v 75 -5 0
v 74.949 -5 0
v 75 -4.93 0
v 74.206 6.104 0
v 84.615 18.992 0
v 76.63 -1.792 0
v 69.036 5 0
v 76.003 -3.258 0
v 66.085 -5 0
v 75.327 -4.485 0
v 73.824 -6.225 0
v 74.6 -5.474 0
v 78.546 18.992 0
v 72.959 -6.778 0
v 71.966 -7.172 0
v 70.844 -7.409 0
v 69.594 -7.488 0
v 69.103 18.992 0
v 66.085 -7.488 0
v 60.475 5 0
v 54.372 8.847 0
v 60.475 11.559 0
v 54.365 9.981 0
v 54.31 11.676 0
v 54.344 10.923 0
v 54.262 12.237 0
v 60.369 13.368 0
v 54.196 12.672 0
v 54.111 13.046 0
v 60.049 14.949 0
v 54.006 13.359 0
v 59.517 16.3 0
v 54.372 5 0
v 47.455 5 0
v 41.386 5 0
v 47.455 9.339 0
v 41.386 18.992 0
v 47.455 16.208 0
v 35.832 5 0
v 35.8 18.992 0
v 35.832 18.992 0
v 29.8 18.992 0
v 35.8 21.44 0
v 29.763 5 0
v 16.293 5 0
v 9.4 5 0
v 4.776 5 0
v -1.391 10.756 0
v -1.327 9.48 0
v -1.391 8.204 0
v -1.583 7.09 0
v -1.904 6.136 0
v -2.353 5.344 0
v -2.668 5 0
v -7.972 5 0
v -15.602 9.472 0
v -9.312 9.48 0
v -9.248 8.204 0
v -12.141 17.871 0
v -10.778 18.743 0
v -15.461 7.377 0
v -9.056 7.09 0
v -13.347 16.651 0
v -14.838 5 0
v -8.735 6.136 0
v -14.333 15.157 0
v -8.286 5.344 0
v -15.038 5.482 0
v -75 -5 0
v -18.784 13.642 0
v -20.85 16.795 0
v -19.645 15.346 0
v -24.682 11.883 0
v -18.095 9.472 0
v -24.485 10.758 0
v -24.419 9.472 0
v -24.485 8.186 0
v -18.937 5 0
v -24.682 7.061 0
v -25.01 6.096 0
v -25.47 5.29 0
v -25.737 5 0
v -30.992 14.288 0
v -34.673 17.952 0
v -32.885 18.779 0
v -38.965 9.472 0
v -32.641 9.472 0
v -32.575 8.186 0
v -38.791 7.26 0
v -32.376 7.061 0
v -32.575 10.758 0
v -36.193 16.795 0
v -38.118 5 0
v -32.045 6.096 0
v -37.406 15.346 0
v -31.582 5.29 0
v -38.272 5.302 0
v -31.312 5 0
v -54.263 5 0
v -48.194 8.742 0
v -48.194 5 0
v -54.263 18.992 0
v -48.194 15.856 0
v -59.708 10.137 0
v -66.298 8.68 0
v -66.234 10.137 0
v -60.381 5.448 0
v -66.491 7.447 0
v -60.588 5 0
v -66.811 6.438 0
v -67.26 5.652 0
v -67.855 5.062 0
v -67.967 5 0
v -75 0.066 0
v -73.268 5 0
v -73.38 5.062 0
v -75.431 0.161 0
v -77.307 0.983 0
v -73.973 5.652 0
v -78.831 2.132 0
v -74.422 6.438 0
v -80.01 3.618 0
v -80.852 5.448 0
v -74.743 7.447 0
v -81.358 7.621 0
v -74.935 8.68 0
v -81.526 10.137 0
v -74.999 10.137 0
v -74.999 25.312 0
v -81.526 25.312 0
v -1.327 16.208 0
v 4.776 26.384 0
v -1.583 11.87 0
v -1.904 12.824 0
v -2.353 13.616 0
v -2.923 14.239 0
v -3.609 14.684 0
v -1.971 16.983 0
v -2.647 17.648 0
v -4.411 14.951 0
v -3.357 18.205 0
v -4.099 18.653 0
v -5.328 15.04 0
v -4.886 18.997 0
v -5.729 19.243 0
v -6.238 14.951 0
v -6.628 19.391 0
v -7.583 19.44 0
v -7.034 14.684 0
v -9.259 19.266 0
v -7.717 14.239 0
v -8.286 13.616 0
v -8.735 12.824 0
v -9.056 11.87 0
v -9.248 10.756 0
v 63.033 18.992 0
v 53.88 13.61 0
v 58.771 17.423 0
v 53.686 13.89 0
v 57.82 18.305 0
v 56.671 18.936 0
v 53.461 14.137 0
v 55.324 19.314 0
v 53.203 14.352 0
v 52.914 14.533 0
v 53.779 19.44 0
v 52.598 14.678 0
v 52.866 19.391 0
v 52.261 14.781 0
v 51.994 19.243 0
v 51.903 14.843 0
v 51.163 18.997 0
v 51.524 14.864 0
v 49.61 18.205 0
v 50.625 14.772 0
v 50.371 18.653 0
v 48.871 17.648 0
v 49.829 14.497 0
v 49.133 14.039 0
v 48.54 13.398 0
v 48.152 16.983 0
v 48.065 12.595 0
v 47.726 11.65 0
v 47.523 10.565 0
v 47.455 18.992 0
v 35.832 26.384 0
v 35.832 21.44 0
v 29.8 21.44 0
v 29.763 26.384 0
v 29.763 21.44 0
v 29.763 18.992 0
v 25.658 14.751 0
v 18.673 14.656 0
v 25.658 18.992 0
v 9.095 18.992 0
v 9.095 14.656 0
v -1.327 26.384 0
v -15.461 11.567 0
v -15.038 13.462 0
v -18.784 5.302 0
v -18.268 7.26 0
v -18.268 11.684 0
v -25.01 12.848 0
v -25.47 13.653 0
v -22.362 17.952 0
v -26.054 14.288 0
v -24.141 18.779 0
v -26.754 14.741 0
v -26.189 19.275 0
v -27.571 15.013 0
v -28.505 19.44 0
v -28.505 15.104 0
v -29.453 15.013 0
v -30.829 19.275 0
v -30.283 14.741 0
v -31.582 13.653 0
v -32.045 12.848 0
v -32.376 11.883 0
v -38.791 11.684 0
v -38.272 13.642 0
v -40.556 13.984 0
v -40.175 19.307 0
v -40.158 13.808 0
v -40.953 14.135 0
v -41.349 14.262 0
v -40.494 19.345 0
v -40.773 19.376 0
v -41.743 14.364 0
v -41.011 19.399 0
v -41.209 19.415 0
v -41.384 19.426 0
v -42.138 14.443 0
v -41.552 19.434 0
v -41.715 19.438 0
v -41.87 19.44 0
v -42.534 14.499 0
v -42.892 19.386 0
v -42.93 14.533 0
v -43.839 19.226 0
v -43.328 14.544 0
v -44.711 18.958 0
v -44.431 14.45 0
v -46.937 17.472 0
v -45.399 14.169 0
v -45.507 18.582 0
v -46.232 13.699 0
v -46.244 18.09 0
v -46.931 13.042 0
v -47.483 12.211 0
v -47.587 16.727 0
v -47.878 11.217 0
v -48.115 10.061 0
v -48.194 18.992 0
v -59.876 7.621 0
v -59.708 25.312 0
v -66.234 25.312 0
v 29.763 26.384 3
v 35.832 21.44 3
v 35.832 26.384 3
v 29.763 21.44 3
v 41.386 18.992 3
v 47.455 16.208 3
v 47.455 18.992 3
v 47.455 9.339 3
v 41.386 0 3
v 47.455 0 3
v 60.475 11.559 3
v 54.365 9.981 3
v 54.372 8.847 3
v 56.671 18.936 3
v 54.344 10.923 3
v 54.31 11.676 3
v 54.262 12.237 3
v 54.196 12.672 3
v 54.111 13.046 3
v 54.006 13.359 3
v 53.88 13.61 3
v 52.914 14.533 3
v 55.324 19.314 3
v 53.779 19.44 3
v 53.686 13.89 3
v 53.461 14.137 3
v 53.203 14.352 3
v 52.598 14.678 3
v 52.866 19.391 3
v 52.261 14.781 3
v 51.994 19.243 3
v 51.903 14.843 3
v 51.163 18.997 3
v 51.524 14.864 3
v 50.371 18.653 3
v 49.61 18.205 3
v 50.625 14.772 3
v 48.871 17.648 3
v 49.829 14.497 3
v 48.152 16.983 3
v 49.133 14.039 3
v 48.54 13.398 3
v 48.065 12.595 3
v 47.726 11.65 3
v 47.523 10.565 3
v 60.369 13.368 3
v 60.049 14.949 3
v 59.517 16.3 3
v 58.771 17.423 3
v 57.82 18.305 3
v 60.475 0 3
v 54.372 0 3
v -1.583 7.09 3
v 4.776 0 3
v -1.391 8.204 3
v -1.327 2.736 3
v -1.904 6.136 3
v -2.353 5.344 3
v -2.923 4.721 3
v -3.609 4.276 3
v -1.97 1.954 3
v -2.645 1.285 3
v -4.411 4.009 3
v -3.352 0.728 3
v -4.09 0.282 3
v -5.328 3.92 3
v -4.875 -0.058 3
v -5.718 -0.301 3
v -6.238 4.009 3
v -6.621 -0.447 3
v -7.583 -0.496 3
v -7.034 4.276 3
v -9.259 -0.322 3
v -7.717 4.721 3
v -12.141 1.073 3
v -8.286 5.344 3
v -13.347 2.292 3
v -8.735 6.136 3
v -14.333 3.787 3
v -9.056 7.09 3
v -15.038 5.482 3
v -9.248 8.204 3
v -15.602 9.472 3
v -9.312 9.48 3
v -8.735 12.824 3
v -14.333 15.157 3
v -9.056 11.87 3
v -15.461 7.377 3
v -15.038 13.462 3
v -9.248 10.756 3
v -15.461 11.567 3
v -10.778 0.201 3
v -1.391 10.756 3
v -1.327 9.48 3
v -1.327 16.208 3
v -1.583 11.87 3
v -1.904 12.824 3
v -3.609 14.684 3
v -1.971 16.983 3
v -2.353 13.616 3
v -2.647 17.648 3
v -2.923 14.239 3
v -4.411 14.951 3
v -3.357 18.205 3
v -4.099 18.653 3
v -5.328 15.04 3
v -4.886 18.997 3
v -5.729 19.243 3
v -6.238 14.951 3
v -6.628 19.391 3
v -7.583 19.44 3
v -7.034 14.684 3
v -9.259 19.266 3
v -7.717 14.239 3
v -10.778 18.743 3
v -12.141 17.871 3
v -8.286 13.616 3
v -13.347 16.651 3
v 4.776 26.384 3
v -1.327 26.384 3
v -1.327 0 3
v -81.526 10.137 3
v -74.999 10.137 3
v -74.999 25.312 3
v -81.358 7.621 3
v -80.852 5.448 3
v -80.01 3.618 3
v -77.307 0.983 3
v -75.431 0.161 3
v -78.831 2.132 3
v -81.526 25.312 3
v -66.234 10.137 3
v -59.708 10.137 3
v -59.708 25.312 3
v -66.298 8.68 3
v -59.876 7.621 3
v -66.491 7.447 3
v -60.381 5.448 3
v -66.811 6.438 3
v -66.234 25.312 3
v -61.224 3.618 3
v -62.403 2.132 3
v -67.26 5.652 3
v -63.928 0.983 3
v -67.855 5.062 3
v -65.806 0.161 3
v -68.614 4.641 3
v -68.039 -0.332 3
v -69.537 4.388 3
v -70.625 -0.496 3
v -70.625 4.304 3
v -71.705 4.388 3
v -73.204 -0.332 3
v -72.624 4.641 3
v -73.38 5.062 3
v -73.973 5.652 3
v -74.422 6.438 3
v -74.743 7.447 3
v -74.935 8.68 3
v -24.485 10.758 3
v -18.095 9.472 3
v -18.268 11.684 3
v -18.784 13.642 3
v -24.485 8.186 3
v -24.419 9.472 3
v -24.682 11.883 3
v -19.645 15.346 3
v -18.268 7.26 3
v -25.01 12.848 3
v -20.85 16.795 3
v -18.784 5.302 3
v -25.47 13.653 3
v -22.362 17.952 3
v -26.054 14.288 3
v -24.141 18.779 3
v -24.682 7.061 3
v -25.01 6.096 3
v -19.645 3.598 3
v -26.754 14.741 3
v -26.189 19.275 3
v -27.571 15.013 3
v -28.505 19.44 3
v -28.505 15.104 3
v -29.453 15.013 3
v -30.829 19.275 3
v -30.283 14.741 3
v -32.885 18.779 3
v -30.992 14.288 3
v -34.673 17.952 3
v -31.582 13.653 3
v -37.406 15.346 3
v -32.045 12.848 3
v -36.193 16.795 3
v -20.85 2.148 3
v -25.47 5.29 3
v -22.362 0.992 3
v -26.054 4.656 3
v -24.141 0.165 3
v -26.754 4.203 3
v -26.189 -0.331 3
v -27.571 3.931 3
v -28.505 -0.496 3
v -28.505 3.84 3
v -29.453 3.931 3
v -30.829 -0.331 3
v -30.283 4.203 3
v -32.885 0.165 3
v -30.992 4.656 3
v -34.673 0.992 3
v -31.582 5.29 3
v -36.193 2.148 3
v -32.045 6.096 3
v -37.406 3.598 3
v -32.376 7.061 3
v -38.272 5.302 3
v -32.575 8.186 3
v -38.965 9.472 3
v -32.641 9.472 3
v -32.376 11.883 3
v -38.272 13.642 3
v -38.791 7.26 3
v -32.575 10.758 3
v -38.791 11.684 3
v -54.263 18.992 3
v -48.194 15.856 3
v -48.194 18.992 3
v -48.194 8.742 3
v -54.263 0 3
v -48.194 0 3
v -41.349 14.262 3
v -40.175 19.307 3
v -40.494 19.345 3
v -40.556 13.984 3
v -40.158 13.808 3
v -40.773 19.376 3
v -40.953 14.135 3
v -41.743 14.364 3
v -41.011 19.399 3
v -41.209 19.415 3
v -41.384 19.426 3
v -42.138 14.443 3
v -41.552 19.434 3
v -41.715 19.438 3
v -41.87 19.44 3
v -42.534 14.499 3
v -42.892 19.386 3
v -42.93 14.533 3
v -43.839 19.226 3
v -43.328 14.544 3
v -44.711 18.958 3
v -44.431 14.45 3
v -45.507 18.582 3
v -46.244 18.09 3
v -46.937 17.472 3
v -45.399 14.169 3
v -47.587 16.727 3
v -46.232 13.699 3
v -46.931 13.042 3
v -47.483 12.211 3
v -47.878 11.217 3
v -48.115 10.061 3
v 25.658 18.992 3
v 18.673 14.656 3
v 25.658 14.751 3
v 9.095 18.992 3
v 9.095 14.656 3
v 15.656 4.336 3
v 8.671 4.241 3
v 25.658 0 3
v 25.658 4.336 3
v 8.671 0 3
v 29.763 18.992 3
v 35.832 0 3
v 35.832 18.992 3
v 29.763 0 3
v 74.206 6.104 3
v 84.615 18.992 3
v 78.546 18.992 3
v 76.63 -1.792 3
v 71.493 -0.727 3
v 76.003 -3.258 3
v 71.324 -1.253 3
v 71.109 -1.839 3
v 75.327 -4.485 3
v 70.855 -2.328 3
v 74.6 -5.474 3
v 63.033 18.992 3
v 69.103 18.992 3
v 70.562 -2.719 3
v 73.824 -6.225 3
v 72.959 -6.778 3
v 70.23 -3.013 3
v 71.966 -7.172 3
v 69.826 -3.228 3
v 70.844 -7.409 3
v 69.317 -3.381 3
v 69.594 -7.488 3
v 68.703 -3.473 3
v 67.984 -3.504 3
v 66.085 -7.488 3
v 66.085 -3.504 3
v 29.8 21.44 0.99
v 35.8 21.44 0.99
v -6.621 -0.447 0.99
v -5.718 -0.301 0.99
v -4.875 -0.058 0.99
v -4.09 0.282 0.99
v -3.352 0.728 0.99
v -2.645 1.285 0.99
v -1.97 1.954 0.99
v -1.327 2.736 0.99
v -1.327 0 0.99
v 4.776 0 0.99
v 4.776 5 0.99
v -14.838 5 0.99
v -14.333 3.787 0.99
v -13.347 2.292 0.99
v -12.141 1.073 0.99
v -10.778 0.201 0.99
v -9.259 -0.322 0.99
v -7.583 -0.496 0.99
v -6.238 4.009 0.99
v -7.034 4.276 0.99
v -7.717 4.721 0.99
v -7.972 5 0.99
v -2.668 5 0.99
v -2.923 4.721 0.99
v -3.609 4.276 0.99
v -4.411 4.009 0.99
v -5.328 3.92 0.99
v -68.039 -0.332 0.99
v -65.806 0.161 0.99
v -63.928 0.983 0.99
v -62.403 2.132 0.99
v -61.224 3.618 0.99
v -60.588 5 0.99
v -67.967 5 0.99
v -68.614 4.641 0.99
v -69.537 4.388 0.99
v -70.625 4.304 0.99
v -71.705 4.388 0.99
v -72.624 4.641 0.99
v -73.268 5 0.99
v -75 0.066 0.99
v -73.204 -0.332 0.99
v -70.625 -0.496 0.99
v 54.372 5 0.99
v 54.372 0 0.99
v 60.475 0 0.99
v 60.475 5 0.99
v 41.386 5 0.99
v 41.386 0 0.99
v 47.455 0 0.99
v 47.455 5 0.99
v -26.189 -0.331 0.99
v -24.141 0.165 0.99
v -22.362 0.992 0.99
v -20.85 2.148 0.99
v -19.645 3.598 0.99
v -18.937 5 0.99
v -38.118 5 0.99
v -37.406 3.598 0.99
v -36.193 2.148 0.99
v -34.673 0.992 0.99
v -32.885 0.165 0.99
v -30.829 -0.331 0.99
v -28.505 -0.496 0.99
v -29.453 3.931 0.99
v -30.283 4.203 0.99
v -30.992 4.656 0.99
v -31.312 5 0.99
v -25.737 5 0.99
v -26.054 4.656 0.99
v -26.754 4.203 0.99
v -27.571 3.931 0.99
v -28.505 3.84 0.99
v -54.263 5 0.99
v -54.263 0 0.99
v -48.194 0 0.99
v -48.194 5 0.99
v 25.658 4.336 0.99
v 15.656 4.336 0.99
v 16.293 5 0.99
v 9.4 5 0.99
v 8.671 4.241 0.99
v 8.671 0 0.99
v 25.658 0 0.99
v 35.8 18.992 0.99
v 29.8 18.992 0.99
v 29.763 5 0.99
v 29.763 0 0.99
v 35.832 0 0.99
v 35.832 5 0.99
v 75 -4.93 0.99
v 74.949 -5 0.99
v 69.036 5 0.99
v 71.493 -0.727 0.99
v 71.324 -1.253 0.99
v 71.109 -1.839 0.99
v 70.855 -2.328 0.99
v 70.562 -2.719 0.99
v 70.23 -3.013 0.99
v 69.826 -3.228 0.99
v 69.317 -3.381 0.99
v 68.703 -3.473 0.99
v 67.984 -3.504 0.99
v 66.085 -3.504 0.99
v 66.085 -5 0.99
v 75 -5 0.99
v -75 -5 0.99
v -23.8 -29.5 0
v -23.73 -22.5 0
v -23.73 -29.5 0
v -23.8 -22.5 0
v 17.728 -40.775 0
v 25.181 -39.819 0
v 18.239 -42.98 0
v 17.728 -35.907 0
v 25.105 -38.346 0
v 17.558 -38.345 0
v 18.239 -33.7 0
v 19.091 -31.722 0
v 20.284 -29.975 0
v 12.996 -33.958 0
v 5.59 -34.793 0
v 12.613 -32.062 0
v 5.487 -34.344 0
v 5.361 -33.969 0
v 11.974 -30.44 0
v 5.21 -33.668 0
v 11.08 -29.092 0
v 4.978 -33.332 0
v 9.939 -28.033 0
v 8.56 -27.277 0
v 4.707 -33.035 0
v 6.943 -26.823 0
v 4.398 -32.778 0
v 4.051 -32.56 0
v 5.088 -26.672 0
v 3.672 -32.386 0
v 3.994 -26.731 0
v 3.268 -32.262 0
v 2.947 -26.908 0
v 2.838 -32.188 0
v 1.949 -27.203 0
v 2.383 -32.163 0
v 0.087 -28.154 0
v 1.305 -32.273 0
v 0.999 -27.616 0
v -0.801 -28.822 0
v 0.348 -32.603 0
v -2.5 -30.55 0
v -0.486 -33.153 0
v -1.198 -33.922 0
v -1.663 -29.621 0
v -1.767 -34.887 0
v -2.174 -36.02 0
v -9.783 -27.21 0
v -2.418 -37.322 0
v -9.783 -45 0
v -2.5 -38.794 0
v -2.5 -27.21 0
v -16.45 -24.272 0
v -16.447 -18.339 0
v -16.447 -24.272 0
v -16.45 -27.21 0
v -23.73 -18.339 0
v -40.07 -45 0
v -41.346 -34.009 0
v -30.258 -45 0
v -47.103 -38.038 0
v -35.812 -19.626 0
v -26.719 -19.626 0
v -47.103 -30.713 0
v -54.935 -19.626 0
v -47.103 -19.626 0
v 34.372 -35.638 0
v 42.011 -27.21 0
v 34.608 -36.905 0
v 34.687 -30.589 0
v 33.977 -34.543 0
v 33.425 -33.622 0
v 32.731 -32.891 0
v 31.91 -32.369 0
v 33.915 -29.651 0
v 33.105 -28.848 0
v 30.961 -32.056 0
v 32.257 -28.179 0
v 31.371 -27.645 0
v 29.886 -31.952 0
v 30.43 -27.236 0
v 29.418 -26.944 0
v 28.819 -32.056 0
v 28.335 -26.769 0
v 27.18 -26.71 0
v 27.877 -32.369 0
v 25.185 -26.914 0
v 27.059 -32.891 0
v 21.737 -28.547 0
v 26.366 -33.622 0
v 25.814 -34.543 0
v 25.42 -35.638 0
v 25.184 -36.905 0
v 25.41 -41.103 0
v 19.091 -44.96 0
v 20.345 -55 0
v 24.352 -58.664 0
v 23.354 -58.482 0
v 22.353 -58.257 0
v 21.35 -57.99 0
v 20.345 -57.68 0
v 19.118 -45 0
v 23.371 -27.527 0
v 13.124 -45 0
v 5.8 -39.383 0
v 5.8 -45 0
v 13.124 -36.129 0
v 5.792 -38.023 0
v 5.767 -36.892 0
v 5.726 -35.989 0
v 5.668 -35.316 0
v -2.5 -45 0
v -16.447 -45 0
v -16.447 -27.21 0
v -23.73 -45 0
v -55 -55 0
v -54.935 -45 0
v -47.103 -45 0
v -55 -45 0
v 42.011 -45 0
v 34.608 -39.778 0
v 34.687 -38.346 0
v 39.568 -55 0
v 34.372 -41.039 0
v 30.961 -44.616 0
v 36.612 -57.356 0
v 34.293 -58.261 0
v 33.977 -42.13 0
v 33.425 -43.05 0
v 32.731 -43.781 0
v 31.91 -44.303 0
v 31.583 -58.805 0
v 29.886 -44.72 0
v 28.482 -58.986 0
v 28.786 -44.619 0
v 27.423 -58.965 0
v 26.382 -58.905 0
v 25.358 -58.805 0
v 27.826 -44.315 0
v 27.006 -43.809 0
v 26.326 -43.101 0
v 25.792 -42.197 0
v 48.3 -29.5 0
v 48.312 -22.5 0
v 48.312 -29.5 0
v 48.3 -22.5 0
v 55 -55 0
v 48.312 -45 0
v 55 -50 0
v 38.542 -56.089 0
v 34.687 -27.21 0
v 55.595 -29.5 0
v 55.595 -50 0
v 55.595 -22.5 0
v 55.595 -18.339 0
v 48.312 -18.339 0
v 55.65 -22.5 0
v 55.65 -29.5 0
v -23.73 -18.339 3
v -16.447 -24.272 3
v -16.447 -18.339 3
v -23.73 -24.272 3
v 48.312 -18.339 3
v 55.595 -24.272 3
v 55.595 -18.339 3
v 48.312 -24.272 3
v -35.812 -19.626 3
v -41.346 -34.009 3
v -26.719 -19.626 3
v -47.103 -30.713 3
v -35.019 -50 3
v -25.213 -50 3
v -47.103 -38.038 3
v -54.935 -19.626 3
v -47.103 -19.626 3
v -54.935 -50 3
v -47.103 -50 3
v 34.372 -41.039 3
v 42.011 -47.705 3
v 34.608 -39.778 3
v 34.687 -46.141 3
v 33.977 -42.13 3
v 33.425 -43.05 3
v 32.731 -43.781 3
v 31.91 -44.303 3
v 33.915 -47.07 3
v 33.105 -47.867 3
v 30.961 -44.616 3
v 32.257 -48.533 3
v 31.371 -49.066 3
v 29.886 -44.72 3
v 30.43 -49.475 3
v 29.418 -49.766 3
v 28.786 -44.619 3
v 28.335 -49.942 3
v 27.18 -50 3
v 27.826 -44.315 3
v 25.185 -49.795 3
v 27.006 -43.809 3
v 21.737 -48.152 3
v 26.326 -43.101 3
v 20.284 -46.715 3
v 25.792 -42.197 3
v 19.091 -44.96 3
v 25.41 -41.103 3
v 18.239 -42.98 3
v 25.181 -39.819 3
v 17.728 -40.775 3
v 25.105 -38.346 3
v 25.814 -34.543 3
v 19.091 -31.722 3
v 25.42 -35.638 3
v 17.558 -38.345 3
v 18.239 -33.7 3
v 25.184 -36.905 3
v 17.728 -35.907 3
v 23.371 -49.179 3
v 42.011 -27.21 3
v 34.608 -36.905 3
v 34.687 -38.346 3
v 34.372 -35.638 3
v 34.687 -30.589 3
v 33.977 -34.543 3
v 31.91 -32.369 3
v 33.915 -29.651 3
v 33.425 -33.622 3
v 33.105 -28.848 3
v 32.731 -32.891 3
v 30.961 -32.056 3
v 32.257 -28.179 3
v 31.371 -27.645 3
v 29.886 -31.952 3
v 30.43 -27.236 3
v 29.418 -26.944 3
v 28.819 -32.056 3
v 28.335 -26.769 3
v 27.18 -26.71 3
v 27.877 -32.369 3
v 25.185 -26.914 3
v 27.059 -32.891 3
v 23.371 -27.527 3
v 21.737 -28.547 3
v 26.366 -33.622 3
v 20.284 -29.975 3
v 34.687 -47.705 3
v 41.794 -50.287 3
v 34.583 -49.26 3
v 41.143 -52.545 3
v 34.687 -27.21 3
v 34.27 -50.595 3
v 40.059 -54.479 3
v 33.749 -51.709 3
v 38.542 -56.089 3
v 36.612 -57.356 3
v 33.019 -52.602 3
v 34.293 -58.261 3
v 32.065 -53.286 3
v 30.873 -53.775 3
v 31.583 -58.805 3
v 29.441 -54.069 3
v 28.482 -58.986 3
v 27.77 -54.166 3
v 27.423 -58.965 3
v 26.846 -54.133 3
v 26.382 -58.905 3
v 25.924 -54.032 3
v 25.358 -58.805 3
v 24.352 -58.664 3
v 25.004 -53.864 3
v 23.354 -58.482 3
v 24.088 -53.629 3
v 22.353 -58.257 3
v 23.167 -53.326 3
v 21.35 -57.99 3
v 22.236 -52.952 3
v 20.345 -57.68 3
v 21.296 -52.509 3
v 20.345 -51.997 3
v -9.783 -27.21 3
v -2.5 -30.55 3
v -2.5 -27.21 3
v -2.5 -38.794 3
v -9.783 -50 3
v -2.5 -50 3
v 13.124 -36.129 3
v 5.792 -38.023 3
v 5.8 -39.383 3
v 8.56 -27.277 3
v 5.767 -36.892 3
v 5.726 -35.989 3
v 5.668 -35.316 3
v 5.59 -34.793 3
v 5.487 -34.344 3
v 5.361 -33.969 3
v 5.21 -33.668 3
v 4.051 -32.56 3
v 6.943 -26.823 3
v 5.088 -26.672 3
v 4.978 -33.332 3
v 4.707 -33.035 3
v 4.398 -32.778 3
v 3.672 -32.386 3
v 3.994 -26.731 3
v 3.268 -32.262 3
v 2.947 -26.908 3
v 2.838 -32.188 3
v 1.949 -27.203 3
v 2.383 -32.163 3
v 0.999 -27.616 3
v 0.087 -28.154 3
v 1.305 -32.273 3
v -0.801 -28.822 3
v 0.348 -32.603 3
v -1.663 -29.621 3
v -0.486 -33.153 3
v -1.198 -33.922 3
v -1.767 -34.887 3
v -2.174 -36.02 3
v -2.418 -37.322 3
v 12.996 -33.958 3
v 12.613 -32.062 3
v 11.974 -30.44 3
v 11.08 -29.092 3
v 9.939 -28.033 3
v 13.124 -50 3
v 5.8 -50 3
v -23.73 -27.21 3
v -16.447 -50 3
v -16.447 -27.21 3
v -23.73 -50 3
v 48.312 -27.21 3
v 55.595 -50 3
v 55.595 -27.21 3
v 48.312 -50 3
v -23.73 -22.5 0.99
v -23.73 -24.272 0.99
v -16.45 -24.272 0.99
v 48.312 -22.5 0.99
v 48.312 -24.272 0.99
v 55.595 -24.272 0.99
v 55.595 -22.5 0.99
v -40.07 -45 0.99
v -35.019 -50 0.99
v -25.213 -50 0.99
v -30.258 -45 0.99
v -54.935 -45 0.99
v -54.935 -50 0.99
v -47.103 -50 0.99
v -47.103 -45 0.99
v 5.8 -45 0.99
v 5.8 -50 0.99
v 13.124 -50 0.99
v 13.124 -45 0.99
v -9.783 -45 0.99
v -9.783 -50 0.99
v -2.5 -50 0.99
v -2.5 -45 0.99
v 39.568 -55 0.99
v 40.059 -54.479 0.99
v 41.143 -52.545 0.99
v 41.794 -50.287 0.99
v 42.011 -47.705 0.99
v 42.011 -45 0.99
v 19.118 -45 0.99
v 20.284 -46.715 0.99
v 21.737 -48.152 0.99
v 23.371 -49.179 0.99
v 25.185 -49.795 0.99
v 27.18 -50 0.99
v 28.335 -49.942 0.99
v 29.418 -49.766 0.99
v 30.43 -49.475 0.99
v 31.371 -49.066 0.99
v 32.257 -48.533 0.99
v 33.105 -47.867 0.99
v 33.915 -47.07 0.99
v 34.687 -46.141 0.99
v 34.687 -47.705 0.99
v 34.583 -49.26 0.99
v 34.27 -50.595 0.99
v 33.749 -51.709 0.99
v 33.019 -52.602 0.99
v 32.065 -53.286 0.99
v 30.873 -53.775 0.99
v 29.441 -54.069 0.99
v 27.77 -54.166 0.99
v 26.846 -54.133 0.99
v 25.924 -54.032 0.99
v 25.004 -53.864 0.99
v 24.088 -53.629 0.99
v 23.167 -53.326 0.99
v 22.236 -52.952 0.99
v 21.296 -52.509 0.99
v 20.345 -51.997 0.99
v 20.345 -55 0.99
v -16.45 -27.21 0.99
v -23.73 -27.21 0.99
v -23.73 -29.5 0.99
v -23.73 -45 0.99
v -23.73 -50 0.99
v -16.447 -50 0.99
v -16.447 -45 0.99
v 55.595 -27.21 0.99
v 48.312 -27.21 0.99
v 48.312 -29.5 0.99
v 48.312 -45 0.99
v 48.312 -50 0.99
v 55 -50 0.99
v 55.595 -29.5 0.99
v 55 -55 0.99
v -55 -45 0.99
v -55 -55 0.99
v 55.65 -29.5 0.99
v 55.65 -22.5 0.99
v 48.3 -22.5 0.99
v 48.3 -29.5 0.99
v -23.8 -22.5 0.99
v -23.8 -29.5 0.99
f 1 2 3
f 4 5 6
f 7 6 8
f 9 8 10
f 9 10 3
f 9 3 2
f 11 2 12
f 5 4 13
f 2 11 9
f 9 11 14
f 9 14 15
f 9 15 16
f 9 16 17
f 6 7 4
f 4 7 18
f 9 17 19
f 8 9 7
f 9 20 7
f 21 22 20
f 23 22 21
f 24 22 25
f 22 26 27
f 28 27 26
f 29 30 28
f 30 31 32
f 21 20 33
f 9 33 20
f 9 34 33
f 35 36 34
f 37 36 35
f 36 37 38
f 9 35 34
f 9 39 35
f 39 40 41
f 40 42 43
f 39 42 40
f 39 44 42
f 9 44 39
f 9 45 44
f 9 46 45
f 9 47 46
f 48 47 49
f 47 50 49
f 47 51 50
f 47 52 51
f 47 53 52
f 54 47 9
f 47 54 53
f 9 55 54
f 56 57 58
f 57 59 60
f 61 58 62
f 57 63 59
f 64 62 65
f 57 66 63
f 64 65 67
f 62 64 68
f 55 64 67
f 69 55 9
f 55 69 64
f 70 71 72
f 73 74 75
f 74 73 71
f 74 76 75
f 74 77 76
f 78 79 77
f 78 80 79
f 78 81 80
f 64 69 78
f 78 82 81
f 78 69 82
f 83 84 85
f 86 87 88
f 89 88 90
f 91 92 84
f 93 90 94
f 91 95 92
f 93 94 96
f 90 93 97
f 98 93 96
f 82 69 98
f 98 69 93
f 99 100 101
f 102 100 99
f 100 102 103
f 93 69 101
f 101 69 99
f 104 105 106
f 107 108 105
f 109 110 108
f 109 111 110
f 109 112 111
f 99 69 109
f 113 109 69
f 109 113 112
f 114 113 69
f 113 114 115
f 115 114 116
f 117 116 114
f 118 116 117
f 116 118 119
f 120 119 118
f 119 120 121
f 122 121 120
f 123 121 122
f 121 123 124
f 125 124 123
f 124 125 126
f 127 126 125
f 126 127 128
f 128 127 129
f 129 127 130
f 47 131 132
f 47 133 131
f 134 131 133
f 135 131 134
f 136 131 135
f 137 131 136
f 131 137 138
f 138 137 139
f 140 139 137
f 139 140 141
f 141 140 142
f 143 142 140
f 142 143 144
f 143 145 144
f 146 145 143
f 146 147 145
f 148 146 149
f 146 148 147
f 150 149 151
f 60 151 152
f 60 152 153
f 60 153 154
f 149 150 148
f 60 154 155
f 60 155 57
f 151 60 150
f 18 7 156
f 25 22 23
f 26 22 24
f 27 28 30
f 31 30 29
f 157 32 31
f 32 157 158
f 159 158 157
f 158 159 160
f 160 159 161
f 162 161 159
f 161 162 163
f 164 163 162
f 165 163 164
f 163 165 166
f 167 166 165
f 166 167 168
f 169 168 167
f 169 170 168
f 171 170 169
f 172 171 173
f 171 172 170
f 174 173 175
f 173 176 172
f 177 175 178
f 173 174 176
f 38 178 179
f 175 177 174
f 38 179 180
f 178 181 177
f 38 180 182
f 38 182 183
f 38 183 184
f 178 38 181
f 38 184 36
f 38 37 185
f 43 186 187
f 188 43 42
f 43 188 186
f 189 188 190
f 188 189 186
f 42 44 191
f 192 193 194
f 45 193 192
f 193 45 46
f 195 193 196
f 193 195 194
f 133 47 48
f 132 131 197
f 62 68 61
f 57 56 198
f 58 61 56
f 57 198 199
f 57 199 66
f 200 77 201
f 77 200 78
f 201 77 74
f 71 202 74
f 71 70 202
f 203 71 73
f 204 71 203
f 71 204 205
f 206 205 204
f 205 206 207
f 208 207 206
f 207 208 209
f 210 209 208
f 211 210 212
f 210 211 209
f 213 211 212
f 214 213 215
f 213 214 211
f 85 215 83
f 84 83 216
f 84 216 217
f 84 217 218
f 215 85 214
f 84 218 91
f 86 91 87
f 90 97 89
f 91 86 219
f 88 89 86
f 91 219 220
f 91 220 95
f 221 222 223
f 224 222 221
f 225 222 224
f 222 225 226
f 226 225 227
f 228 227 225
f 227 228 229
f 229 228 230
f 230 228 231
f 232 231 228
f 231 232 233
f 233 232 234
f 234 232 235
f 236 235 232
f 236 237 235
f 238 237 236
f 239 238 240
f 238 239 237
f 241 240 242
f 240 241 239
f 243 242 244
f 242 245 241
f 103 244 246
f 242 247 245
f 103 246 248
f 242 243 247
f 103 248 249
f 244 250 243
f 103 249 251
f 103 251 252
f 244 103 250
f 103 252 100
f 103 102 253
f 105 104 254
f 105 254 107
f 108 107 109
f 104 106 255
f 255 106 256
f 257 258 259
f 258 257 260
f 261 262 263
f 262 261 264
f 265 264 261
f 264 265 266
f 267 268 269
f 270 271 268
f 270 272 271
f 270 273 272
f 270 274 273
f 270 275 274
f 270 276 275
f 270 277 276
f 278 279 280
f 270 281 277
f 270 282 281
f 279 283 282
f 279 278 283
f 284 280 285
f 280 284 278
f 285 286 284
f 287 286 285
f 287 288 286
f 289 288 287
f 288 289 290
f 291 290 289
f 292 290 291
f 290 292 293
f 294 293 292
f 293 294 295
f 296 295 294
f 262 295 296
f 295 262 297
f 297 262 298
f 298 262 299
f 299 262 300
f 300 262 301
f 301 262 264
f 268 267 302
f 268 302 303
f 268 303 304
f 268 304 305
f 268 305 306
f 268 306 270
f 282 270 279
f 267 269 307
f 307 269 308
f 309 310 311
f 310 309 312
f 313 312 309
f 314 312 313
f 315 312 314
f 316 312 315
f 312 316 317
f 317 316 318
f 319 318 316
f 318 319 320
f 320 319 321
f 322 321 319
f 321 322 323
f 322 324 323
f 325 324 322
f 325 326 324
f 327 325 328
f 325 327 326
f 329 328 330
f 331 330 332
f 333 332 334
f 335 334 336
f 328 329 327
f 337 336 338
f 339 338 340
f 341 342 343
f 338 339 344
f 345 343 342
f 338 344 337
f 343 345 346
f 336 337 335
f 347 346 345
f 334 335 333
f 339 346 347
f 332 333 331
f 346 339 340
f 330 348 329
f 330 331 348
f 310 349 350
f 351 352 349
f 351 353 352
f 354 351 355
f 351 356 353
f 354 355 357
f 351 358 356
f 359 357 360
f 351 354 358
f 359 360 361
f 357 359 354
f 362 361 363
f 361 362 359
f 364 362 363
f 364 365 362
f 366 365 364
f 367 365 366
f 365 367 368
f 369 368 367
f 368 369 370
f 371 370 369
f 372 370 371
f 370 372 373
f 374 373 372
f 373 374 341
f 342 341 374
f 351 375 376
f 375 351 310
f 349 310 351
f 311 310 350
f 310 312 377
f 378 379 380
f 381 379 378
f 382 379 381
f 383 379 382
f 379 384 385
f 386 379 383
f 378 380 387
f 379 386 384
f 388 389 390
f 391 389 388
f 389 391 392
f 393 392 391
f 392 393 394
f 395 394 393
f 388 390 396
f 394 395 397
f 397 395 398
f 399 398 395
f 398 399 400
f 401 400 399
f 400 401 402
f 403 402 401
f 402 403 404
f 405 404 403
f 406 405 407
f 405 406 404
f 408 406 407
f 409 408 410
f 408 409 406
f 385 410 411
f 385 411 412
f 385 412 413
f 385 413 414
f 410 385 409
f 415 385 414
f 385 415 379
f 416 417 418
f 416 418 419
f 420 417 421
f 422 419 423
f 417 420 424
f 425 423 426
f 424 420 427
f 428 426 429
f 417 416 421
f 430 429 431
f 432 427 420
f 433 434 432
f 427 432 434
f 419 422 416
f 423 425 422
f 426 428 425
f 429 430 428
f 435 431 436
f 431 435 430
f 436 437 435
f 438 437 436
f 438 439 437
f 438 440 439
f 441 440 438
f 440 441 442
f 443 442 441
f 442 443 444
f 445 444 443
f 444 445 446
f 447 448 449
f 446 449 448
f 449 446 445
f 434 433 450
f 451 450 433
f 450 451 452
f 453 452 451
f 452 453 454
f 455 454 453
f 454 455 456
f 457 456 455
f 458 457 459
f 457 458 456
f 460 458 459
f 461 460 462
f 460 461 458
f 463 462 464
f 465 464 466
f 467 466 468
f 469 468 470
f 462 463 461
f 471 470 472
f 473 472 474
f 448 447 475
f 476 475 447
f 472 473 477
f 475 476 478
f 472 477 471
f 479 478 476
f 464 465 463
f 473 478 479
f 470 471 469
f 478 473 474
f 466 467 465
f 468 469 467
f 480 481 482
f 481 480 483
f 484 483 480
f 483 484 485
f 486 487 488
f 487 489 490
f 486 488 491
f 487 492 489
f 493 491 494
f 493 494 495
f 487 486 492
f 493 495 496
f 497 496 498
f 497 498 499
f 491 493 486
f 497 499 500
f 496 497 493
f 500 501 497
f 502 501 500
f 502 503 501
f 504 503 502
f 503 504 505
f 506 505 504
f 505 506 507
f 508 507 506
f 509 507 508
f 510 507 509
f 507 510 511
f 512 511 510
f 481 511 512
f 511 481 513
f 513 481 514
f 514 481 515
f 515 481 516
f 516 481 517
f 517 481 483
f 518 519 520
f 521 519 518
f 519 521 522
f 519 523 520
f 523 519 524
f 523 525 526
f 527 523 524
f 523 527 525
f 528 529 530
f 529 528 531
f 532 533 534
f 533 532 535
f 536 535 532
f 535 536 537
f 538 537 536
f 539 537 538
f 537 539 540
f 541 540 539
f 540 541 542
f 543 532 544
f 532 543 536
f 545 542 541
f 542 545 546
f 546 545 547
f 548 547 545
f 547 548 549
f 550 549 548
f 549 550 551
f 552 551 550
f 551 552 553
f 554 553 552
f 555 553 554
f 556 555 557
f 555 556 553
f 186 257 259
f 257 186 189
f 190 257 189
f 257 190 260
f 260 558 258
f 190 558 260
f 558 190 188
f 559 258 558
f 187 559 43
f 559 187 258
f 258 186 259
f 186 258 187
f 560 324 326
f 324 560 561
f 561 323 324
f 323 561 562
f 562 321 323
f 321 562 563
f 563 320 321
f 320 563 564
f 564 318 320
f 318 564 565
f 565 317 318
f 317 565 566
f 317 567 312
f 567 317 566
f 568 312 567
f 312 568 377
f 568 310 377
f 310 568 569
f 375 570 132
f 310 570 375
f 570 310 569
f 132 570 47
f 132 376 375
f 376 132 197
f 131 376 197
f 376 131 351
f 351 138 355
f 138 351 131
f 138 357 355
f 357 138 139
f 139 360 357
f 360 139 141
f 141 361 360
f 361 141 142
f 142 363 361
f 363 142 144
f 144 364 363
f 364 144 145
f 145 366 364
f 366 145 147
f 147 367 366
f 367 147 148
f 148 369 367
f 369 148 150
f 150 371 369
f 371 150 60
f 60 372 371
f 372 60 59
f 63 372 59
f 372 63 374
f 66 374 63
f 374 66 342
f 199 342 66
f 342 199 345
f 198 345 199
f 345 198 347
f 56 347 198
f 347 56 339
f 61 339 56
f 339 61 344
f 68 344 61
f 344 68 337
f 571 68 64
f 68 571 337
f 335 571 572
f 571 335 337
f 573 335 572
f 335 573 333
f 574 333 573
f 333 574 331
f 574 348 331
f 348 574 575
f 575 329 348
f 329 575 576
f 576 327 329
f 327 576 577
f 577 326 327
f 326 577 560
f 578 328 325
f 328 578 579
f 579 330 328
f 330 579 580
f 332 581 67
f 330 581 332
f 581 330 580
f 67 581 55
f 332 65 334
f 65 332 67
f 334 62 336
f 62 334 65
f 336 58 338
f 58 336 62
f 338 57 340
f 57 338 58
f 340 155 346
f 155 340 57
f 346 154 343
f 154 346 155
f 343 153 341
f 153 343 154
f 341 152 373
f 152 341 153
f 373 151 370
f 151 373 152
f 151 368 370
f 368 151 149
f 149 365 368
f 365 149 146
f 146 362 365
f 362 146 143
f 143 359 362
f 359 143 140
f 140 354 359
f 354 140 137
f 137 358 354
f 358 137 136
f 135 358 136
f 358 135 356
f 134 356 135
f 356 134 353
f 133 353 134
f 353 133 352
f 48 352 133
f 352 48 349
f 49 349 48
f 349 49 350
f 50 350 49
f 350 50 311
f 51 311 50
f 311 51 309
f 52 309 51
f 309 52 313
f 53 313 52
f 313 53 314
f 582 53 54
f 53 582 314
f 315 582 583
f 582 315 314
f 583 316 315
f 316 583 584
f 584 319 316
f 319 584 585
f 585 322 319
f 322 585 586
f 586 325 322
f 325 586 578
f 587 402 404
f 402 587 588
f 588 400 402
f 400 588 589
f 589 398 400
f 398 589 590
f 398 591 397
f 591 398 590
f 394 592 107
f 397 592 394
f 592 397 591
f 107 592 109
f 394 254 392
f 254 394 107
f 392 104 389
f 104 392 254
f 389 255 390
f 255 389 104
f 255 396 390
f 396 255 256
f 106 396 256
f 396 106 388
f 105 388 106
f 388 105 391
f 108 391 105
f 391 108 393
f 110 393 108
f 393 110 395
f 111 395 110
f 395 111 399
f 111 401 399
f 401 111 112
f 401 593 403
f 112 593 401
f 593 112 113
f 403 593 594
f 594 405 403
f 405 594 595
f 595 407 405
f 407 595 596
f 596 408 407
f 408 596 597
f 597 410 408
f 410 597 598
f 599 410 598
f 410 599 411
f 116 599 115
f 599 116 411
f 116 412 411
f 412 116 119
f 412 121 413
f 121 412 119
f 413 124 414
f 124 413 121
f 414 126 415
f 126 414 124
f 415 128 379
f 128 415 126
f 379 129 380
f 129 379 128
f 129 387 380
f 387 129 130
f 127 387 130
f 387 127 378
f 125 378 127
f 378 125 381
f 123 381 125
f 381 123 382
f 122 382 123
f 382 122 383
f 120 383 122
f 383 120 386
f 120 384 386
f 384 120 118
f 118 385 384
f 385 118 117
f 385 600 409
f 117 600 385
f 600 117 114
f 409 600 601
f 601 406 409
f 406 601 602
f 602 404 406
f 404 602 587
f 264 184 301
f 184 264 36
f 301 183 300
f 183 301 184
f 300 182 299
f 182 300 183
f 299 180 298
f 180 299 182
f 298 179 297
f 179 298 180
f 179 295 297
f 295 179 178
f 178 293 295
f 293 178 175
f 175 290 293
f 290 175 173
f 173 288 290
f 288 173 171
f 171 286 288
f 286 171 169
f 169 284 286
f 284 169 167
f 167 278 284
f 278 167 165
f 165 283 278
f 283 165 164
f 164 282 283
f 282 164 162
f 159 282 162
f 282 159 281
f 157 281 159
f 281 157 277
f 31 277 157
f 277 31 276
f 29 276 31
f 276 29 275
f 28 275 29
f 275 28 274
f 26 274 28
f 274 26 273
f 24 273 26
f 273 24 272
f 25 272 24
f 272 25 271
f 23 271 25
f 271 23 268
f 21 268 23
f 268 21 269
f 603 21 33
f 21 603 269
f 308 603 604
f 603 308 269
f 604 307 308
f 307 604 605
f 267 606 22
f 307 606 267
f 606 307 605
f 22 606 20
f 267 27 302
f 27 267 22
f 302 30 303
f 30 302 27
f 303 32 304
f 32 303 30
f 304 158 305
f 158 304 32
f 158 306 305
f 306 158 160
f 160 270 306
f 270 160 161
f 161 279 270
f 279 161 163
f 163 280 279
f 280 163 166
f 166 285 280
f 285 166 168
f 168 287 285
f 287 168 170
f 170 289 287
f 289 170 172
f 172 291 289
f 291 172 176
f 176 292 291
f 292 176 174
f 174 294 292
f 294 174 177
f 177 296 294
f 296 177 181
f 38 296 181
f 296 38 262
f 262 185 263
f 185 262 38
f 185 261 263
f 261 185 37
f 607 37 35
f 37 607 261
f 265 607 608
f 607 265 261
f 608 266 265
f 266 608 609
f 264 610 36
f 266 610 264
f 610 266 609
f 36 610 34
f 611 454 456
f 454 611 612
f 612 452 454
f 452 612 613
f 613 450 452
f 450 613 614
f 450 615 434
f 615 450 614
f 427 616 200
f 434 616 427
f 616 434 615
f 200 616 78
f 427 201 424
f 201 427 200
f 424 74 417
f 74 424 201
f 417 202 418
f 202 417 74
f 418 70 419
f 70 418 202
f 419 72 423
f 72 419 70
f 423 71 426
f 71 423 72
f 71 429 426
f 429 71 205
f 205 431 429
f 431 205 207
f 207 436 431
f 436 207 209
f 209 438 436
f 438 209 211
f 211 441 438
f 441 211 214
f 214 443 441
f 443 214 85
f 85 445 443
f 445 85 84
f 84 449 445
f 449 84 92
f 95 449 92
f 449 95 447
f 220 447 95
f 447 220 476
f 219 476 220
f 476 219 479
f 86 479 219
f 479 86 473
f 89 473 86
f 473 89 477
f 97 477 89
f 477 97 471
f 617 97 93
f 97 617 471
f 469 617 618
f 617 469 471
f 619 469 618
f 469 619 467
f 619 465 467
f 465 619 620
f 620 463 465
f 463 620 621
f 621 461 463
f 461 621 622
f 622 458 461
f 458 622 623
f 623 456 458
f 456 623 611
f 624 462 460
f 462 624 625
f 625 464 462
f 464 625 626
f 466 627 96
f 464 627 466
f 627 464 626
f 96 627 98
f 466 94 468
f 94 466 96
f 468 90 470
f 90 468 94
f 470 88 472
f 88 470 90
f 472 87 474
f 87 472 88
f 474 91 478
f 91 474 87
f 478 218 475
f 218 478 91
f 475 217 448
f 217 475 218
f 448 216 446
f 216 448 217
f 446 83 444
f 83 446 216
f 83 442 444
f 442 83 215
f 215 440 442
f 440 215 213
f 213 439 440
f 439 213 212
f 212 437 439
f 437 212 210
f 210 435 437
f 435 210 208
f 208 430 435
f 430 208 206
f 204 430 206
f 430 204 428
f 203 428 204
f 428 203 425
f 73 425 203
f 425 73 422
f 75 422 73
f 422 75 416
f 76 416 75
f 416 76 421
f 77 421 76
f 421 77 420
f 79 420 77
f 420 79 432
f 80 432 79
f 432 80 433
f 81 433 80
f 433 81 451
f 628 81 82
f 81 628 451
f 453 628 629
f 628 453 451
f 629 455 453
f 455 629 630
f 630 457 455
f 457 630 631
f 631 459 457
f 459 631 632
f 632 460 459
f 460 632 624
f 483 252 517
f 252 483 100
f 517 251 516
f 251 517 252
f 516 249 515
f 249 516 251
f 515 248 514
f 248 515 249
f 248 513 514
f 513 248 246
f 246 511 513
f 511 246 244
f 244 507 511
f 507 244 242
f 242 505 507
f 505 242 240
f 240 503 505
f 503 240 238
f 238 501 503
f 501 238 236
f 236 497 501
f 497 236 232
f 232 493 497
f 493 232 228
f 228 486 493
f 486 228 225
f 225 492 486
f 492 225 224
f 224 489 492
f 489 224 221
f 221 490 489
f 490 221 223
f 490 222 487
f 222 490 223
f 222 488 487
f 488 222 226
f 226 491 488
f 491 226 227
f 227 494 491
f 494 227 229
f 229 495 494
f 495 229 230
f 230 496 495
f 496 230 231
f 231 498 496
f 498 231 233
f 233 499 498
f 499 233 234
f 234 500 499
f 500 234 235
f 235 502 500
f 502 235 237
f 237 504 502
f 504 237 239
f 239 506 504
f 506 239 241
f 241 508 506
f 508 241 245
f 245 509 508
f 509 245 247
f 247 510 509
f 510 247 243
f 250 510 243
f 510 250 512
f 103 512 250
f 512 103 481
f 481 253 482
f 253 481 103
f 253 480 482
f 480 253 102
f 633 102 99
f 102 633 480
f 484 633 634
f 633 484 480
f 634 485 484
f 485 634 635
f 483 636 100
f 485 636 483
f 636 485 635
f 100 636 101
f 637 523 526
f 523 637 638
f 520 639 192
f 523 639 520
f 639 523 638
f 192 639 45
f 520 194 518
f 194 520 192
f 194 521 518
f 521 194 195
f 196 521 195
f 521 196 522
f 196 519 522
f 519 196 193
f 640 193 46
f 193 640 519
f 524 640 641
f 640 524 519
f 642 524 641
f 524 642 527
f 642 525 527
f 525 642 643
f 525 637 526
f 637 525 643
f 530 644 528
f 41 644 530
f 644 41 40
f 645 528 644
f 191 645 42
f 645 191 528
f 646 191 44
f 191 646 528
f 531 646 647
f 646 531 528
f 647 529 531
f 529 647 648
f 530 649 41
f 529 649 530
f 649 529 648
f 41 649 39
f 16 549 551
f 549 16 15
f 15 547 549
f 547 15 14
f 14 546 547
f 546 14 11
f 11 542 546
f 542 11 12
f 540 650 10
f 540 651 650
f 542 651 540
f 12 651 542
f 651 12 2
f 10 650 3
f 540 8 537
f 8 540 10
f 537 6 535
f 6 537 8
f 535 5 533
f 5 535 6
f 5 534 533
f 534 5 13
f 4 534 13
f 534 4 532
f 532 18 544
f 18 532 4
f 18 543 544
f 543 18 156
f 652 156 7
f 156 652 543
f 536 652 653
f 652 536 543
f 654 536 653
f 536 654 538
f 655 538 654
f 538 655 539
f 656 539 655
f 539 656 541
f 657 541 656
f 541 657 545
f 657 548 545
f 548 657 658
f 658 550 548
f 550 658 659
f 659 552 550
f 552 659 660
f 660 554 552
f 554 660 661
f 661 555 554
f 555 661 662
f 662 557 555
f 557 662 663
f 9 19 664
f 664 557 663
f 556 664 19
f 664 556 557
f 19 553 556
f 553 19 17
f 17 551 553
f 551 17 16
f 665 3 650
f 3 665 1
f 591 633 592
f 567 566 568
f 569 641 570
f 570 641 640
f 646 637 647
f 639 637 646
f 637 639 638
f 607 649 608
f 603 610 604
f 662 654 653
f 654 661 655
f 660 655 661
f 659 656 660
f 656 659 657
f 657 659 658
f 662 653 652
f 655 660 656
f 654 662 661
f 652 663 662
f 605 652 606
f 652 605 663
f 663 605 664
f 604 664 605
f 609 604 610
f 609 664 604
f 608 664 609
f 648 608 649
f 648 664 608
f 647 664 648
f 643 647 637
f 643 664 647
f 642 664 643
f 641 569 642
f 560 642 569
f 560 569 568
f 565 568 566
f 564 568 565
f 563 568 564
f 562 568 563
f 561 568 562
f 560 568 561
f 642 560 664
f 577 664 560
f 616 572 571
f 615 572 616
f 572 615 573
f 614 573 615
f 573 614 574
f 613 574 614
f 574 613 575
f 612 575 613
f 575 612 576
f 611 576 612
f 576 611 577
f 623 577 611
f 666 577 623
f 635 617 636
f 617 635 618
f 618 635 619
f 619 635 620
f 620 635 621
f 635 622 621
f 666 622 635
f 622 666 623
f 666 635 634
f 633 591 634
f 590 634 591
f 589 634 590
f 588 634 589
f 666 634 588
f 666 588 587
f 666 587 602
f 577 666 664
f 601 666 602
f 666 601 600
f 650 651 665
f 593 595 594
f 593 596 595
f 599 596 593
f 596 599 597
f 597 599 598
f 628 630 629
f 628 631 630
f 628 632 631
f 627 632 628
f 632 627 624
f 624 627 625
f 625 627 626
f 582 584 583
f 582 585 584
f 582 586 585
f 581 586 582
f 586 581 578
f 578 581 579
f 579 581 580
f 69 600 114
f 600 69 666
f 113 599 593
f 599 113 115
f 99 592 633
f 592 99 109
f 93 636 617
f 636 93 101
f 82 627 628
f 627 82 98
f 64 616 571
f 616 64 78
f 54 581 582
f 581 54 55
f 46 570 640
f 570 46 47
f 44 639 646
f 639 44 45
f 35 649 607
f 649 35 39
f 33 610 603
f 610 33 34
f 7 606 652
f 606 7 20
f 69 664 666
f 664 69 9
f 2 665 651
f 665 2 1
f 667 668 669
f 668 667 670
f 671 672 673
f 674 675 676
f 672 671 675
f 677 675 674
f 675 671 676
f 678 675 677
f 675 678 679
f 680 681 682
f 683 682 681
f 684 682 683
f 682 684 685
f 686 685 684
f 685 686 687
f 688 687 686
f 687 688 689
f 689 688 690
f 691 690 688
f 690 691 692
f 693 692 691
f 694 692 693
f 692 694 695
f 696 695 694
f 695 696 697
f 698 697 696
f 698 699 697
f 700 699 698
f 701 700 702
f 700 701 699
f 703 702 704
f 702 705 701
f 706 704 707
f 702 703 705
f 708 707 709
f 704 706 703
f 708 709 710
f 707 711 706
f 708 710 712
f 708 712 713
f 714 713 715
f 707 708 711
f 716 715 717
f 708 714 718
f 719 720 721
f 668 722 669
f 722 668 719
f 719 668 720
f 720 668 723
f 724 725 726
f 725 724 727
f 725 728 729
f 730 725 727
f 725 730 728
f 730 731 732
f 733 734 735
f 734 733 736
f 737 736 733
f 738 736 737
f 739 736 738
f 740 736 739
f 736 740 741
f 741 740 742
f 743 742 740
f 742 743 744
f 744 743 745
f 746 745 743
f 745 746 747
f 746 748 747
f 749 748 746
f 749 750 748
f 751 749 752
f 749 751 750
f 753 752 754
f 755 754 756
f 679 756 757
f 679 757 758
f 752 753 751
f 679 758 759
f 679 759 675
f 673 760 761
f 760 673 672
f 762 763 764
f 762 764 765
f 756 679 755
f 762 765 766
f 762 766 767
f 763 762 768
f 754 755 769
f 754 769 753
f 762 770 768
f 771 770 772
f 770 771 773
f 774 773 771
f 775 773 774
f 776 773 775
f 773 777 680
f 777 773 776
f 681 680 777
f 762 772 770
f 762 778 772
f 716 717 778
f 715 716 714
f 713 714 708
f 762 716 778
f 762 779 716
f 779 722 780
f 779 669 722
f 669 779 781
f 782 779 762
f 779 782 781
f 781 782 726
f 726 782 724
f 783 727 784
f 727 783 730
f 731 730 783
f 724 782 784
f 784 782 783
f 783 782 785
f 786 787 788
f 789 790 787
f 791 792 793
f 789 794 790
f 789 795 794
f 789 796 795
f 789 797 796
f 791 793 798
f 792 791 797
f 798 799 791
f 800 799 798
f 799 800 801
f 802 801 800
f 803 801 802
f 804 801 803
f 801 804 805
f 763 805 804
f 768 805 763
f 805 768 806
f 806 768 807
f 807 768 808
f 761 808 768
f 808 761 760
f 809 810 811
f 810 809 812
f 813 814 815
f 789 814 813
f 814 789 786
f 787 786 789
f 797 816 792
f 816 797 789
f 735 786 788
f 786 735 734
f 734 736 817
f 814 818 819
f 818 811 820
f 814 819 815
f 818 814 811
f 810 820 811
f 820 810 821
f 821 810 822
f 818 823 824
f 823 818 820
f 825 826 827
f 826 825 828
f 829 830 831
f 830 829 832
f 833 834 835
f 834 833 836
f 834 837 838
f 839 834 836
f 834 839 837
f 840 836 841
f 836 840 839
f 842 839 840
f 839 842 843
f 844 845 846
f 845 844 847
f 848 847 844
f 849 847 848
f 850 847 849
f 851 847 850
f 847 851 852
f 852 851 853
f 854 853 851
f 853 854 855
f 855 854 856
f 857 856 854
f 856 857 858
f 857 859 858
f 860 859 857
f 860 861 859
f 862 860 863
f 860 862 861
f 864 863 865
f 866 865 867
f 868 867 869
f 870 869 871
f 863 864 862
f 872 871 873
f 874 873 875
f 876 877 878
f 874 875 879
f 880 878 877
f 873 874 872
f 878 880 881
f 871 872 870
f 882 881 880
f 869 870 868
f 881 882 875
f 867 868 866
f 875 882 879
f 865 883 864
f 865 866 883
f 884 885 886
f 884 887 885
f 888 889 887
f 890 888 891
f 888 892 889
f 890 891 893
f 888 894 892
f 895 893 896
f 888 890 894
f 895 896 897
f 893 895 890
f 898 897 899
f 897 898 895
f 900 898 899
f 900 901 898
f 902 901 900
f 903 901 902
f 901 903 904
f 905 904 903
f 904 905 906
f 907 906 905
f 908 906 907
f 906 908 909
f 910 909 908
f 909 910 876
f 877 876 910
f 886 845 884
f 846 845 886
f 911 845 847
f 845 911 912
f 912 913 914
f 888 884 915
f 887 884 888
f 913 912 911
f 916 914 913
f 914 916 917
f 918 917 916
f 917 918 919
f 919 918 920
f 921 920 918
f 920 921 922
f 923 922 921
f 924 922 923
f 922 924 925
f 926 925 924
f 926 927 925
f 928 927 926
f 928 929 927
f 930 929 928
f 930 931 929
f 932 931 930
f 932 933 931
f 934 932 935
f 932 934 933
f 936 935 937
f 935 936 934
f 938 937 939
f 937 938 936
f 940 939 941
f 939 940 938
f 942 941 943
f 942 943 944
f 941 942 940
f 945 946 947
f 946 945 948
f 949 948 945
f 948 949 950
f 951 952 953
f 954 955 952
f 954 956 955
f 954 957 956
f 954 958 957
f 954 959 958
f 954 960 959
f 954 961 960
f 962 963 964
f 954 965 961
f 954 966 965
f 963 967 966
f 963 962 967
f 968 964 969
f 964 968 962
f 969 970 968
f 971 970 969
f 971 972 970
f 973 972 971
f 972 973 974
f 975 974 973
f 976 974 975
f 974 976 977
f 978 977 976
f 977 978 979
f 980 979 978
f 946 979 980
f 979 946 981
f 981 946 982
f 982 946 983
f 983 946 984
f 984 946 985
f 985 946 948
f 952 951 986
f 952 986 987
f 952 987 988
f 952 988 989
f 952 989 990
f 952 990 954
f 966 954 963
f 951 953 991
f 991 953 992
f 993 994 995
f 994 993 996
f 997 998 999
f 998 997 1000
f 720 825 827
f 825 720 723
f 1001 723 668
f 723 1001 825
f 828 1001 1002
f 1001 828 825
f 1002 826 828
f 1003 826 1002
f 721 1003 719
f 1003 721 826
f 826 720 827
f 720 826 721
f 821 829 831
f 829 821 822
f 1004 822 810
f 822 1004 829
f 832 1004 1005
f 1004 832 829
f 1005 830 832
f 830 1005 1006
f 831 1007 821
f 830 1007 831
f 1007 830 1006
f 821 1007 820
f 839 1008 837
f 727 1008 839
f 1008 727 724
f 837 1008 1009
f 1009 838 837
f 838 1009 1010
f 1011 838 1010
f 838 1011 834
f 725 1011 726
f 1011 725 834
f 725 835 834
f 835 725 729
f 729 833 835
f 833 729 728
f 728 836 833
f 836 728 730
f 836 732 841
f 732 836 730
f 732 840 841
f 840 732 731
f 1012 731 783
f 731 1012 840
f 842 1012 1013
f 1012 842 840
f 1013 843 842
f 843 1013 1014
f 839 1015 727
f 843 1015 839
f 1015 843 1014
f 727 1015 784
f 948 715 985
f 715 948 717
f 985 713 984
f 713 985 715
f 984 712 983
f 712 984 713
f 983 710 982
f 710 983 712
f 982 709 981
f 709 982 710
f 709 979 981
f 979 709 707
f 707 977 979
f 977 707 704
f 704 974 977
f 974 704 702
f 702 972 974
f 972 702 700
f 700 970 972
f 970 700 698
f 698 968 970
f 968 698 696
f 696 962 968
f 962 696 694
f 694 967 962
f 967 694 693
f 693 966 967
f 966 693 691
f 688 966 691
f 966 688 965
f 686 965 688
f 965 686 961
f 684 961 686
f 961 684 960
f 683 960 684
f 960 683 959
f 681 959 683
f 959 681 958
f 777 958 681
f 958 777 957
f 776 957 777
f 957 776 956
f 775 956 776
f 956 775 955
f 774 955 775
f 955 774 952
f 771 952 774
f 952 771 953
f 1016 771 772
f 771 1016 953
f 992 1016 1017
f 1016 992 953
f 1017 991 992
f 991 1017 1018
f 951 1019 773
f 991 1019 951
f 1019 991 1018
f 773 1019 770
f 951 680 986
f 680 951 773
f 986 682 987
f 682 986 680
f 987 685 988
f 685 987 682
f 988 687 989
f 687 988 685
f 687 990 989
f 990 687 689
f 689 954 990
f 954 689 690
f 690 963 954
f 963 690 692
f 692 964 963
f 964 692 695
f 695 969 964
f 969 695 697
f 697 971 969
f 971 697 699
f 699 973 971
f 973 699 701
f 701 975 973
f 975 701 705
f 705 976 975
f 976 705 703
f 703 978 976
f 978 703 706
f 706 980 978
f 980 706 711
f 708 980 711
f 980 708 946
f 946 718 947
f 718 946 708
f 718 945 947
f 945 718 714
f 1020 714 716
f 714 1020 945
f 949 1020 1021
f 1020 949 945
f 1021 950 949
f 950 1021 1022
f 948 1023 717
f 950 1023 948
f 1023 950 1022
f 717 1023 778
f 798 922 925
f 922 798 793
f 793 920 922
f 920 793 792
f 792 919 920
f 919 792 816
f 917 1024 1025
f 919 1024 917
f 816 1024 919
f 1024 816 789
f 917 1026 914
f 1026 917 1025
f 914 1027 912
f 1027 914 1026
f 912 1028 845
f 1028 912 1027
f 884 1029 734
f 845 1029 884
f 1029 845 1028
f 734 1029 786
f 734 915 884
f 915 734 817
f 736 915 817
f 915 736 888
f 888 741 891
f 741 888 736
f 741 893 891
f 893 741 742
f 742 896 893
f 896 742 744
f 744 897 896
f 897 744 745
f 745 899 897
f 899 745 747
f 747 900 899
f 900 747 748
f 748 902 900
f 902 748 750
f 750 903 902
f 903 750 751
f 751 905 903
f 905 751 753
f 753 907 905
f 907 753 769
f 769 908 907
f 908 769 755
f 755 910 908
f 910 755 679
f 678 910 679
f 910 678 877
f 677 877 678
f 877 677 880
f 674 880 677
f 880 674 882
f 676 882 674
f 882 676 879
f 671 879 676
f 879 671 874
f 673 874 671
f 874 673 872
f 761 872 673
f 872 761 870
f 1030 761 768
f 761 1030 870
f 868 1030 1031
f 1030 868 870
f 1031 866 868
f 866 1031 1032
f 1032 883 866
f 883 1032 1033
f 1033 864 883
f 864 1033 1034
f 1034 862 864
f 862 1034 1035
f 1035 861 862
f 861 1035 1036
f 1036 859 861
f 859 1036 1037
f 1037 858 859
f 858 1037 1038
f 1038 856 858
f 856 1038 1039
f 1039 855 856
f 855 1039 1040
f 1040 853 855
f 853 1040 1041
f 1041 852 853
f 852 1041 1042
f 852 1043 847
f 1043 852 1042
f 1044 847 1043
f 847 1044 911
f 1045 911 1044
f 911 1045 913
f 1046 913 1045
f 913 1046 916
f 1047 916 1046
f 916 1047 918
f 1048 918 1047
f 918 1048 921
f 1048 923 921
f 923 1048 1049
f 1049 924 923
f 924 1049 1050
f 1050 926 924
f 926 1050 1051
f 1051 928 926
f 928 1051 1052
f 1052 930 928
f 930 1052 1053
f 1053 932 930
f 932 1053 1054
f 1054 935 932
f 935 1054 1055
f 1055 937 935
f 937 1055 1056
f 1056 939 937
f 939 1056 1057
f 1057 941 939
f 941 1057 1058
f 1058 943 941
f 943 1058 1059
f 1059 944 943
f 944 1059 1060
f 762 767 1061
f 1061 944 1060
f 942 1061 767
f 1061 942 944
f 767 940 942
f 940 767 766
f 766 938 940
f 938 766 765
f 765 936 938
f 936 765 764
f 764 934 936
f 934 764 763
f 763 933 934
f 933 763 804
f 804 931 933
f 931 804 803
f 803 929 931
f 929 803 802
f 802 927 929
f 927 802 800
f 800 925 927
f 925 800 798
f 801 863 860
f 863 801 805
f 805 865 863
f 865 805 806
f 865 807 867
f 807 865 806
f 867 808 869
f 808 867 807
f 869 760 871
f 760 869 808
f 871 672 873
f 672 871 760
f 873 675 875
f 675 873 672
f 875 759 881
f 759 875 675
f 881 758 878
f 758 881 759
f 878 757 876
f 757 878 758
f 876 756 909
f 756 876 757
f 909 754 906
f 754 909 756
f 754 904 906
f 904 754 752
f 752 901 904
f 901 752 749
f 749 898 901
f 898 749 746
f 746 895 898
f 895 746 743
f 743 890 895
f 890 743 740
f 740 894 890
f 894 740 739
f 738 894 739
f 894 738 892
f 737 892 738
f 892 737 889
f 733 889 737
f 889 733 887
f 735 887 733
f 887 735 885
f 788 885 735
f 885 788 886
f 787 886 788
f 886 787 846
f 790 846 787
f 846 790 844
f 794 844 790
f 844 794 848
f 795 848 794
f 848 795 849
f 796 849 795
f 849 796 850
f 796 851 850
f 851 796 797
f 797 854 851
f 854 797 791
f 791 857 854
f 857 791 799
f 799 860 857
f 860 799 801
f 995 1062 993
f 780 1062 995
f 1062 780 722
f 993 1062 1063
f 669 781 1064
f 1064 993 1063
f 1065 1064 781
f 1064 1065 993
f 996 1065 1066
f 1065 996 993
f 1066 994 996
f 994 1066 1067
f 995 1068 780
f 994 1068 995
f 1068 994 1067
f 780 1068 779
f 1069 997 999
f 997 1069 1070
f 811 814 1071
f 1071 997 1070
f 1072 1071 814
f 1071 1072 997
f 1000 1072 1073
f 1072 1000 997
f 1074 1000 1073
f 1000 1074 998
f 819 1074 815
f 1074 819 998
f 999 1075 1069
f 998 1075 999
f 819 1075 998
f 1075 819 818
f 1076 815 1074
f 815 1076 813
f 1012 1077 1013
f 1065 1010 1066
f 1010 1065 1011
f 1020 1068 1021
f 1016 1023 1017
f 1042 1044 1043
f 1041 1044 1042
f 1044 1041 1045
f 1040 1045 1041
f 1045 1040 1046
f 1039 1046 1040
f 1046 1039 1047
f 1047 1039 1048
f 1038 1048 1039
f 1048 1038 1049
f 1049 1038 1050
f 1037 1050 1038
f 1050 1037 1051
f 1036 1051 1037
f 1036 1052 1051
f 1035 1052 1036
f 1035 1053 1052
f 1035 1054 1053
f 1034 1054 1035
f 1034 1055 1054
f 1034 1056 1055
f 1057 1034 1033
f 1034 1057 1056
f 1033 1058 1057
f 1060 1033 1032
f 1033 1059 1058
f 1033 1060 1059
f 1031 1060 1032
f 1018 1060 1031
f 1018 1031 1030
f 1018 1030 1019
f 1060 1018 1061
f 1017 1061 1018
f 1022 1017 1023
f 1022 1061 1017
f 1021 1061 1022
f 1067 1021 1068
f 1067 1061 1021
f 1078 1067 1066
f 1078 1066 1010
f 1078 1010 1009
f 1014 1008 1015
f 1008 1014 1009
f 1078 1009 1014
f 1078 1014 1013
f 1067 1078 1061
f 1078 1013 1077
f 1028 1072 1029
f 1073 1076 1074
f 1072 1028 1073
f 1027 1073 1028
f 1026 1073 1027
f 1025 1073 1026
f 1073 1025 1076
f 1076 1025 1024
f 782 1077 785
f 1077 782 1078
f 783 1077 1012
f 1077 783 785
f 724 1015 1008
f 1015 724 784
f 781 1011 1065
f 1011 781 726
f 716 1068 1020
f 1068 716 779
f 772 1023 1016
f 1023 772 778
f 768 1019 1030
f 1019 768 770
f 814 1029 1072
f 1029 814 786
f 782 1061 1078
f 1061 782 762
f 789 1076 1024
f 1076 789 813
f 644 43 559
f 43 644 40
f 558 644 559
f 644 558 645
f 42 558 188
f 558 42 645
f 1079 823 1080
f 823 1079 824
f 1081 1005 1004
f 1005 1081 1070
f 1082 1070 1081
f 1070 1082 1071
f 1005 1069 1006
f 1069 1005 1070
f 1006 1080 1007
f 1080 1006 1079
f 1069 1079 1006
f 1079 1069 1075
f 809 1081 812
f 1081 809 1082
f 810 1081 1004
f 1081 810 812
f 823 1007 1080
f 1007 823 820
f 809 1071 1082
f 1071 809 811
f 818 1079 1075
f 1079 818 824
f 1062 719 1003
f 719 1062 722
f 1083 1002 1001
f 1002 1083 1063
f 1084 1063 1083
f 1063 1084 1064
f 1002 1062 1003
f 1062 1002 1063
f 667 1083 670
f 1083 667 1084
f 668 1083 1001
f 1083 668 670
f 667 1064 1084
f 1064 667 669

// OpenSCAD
font="Bitstream Vera Sans:style=Bold";
//font="Titan One";
//font="Baskerville:style=Bold";
text_on_flat="Urodziny";
text_on_flat2="Kingi";
text_size=40;
depth=3;
spacing=1;

frame_z_offset = 0.5*text_size;

frame_width=10;
frame_depth=20;
frame_cover_overlap=frame_width*0.8;
picture_overlap=frame_width-frame_cover_overlap;

picture_x=100;
picture_z=150;
picture_depth=0.5*frame_depth;

cover_spacing=0.4;
cover_wall_width=0.8;
cover_depth_multiplier=0.8;

module the_bar(length) {
  bar_depth = 0.33*depth;
  translate([0, 0, 0.5*bar_depth]) cube([length, 0.25*text_size, bar_depth], center=true);
}


module the_text(text, size) {
linear_extrude(height=depth, convexity=4)
    text(text, 
         size=size,
         font=font,
         halign="center",
         spacing=spacing);
}

module the_text_with_bar(text, size, length) {
linear_extrude(height=depth, convexity=4)
    text(text, 
         size=size,
         font=font,
         halign="center",
         spacing=spacing);
  the_bar(length);
}

module ibar(width, length) {
  cube([width, length, 0.33*depth]);
}


the_text_with_bar(text_on_flat, 25, 150);
translate([0, -50, 0]) the_text_with_bar(text_on_flat2, 30, 110);
//the_frame();
//cover();
translate([29.8, 18, 0]) ibar(6,6);
translate([48.3, -29.5, 0]) ibar(7.35,7);
translate([-23.8, -29.5, 0]) ibar(7.35,7);
